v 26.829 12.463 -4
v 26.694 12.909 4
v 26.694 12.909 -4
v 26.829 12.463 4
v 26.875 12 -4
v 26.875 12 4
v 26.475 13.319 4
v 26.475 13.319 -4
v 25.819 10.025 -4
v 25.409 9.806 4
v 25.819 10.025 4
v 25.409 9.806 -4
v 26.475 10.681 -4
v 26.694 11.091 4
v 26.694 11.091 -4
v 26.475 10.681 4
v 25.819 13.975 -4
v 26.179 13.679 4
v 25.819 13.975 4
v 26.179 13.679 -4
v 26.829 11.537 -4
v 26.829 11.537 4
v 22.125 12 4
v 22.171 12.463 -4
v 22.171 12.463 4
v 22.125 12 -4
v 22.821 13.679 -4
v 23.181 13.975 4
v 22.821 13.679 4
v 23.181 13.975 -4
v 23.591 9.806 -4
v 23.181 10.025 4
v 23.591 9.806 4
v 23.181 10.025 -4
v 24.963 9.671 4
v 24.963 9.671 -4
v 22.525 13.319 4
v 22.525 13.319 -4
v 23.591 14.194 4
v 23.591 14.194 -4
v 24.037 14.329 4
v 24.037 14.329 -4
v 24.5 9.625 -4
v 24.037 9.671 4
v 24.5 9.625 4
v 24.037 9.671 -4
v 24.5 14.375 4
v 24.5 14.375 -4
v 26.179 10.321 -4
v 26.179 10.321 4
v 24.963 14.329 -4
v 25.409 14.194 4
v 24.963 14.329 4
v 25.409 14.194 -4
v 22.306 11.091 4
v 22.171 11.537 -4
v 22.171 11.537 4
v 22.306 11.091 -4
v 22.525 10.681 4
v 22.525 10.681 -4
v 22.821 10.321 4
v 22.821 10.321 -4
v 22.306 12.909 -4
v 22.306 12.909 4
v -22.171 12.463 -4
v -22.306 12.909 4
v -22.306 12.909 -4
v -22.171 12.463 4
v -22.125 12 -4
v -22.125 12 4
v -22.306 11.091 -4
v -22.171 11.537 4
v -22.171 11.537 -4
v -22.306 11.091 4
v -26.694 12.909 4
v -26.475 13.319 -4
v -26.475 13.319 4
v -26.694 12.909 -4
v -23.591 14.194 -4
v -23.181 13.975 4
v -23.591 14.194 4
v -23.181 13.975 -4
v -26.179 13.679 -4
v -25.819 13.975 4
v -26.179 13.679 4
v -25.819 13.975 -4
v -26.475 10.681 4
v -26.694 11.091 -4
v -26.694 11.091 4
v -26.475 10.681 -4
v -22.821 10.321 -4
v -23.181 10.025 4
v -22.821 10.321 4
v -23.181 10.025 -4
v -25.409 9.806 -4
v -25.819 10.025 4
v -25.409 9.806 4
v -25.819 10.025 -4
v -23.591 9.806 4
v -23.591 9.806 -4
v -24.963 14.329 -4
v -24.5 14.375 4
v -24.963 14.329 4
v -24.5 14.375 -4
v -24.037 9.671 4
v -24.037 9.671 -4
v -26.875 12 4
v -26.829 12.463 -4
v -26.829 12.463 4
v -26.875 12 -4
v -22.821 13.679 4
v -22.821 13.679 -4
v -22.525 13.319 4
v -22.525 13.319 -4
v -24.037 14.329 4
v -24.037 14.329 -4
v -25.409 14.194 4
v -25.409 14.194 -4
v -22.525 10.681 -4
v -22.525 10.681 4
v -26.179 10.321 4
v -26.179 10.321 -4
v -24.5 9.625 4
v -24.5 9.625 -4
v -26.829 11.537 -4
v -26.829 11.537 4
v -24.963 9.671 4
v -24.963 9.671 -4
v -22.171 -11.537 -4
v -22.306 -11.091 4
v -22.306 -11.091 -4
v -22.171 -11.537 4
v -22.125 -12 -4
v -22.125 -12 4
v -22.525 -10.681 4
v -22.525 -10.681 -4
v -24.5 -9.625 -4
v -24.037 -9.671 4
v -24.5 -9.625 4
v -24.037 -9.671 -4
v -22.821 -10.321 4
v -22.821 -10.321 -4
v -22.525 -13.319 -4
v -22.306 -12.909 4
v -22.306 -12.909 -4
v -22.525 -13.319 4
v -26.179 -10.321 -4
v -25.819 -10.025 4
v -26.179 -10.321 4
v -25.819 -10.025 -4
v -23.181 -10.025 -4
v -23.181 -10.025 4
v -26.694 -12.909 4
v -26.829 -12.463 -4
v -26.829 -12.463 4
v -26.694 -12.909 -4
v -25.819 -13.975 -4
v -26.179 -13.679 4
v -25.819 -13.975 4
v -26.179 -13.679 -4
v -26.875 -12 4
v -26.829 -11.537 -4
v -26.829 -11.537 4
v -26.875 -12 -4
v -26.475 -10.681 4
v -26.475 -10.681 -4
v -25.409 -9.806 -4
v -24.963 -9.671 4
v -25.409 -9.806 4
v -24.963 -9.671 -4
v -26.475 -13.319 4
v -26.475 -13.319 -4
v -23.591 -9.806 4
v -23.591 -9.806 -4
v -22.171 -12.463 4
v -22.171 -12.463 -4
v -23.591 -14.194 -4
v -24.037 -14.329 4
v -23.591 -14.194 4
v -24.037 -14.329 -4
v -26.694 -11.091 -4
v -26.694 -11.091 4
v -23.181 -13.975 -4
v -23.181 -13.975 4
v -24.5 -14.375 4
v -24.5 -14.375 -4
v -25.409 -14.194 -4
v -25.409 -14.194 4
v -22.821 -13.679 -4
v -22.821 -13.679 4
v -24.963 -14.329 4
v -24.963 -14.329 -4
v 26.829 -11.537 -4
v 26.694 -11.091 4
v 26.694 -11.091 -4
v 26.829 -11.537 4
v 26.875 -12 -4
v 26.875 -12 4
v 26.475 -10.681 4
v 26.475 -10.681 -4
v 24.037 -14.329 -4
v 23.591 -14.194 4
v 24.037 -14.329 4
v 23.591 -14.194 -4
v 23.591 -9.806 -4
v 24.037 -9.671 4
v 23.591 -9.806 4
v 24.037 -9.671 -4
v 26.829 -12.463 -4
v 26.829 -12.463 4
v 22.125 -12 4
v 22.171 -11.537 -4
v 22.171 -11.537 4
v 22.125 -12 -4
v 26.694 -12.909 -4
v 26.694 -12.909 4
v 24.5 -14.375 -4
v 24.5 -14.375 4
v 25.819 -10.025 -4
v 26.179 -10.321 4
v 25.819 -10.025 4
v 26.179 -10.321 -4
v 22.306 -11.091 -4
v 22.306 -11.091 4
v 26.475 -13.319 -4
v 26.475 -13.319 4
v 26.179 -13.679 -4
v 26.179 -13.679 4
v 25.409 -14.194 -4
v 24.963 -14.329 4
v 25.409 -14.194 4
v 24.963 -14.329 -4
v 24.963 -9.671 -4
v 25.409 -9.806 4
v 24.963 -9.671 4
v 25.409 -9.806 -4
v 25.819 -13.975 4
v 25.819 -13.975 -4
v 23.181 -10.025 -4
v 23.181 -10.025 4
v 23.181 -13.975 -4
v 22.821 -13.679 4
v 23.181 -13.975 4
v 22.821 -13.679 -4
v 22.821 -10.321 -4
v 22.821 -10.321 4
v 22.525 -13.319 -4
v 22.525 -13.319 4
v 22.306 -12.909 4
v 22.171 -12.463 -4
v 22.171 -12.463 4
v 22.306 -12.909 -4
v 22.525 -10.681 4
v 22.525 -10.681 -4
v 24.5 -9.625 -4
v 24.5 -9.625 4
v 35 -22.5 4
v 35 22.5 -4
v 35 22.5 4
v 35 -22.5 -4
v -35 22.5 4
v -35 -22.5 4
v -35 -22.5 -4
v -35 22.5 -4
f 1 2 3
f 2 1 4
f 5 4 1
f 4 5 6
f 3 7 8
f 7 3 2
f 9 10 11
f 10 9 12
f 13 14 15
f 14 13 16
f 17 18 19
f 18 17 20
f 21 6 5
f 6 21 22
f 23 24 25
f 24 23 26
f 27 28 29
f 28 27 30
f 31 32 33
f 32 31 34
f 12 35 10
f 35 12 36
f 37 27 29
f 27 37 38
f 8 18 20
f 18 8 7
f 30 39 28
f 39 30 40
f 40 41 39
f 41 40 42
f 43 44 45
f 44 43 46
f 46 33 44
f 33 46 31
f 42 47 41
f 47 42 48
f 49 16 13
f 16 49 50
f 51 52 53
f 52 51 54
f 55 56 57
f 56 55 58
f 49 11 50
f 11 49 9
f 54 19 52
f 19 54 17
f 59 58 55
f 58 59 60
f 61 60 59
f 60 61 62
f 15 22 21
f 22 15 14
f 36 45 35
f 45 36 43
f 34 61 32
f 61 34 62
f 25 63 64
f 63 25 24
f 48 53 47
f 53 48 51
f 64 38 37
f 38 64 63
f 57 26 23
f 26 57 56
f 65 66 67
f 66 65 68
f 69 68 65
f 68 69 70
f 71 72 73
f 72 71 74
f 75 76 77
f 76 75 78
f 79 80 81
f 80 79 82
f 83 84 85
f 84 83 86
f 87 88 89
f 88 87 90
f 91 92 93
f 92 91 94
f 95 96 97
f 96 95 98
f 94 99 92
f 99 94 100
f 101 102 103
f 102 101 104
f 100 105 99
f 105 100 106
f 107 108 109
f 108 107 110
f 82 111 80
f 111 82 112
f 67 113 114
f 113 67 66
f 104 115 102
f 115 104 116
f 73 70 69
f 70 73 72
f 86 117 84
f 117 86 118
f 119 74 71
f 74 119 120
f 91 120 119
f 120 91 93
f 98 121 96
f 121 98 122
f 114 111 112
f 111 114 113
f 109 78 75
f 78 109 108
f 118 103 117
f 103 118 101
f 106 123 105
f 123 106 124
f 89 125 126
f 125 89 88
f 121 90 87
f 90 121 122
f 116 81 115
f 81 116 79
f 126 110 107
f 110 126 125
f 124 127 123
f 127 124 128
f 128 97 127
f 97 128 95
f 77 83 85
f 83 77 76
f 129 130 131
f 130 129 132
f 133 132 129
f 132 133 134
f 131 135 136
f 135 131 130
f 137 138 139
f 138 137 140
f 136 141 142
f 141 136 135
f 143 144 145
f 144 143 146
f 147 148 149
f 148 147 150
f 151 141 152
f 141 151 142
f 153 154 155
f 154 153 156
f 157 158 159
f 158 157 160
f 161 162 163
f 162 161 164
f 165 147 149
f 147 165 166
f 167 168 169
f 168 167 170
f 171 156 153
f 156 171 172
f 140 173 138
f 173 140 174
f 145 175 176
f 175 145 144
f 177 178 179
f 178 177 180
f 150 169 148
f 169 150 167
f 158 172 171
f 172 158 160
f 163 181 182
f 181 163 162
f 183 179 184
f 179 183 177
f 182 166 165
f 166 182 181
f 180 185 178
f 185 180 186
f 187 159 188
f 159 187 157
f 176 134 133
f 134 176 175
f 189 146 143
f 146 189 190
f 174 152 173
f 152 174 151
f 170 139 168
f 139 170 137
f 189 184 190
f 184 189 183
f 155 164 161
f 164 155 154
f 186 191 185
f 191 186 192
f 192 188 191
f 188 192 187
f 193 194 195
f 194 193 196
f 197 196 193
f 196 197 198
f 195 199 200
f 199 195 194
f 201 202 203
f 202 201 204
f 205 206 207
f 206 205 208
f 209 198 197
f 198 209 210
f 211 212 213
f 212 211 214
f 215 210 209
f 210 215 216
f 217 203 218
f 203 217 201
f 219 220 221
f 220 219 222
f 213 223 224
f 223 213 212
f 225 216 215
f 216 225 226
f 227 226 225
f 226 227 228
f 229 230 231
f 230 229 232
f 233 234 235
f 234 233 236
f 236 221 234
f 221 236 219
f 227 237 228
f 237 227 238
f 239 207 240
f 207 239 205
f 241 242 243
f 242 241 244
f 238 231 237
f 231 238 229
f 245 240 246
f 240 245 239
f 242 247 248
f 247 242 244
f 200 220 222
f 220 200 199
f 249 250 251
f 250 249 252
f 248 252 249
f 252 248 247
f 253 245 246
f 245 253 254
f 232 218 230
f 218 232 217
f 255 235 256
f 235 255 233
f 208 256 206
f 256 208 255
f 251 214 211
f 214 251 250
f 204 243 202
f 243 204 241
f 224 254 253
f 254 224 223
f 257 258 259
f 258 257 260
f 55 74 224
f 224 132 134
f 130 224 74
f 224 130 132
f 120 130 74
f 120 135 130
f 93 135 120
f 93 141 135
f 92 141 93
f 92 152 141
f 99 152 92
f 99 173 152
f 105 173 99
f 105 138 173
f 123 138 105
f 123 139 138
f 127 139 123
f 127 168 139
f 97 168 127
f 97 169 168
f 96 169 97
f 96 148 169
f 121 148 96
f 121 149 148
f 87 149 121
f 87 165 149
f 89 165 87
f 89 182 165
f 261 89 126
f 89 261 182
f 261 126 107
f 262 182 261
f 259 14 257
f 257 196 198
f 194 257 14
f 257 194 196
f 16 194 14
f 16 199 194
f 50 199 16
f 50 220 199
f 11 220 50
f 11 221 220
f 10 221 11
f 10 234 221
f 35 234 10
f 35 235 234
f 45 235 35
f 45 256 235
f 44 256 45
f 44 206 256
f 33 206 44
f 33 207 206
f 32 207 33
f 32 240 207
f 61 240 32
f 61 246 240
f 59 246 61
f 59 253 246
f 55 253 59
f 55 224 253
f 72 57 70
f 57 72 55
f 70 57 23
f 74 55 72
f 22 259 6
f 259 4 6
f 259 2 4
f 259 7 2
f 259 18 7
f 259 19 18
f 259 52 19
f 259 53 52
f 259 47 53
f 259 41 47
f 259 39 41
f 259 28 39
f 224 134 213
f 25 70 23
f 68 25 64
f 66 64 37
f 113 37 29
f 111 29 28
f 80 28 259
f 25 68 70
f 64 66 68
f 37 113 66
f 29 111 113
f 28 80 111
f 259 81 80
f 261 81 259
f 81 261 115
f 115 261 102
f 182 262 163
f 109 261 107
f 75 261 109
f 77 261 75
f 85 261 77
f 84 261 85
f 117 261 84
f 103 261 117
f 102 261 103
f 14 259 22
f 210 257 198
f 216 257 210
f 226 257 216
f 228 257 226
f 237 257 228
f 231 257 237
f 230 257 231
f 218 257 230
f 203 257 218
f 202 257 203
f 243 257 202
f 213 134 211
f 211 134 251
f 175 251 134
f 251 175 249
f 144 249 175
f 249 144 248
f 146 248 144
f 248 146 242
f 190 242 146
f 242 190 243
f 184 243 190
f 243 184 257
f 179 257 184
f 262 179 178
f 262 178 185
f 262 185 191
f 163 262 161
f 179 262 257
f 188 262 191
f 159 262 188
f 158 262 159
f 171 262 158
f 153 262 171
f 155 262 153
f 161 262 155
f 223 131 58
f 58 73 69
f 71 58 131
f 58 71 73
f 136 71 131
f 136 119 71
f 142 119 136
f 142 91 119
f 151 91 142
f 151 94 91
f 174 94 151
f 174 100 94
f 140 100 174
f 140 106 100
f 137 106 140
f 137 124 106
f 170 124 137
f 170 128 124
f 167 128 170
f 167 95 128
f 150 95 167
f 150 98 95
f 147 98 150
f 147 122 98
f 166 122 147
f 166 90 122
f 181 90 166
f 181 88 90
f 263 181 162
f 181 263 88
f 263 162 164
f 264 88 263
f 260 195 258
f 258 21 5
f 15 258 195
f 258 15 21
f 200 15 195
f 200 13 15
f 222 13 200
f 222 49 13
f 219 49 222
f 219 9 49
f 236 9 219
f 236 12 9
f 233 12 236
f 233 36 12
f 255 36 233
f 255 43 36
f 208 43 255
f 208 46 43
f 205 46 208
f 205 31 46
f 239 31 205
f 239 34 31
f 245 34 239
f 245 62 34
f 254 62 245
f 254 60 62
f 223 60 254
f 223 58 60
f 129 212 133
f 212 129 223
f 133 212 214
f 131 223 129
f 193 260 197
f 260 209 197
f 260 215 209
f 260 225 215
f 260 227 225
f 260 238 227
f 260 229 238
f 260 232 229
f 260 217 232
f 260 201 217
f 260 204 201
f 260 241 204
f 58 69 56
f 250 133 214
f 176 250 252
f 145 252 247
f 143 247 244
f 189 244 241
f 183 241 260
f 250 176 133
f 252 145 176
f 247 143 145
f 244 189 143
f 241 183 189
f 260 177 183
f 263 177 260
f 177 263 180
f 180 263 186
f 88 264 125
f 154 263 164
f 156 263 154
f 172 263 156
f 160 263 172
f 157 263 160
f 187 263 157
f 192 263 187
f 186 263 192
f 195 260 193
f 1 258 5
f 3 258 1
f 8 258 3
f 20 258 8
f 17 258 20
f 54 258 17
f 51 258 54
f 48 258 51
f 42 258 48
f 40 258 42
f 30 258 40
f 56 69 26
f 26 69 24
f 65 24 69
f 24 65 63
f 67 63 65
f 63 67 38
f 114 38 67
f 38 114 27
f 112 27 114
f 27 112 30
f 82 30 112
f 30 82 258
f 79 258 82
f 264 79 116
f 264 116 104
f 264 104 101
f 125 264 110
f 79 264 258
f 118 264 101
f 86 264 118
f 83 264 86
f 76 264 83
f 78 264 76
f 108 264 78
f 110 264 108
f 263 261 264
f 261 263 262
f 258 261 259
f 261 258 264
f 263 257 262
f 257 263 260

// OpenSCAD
$fn = 32;

// ----------------------------------------------------------------------
// Corner plate 70 x 45 x 8
// 4 holes, centres taken from the edge offset
// ----------------------------------------------------------------------

// --- parameters (mm) ---
plate = [70, 45, 8];     // overall size (x, y, z)
holes = 4;               // number of holes the drawing asks for
bore_d = 4.5;            // nominal hole diameter from the drawing
print_allowance = 0.25;  // clearance added for printing
edge = 10.5;             // hole centre offset from the plate edge

// --- derived feature positions (mm) ---
hole_d = bore_d + print_allowance;  // = 4.75   hole diameter as printed
corner_x = plate[0] / 2 - edge;     // = 24.5   corner hole X
corner_y = plate[1] / 2 - edge;     // = 12   corner hole Y
feature_centers = [
  [corner_x, corner_y],
  [-corner_x, corner_y],
  [-corner_x, -corner_y],
  [corner_x, -corner_y]
];   // hole centres the loop below drills

// plate outline, every hole drilled through with the same cutters
difference() {
  cube(plate, center = true);
  for (centre = feature_centers)
    translate([centre[0], centre[1], 0])
      cylinder(d = hole_d, h = plate[2] + 2, center = true);
}
